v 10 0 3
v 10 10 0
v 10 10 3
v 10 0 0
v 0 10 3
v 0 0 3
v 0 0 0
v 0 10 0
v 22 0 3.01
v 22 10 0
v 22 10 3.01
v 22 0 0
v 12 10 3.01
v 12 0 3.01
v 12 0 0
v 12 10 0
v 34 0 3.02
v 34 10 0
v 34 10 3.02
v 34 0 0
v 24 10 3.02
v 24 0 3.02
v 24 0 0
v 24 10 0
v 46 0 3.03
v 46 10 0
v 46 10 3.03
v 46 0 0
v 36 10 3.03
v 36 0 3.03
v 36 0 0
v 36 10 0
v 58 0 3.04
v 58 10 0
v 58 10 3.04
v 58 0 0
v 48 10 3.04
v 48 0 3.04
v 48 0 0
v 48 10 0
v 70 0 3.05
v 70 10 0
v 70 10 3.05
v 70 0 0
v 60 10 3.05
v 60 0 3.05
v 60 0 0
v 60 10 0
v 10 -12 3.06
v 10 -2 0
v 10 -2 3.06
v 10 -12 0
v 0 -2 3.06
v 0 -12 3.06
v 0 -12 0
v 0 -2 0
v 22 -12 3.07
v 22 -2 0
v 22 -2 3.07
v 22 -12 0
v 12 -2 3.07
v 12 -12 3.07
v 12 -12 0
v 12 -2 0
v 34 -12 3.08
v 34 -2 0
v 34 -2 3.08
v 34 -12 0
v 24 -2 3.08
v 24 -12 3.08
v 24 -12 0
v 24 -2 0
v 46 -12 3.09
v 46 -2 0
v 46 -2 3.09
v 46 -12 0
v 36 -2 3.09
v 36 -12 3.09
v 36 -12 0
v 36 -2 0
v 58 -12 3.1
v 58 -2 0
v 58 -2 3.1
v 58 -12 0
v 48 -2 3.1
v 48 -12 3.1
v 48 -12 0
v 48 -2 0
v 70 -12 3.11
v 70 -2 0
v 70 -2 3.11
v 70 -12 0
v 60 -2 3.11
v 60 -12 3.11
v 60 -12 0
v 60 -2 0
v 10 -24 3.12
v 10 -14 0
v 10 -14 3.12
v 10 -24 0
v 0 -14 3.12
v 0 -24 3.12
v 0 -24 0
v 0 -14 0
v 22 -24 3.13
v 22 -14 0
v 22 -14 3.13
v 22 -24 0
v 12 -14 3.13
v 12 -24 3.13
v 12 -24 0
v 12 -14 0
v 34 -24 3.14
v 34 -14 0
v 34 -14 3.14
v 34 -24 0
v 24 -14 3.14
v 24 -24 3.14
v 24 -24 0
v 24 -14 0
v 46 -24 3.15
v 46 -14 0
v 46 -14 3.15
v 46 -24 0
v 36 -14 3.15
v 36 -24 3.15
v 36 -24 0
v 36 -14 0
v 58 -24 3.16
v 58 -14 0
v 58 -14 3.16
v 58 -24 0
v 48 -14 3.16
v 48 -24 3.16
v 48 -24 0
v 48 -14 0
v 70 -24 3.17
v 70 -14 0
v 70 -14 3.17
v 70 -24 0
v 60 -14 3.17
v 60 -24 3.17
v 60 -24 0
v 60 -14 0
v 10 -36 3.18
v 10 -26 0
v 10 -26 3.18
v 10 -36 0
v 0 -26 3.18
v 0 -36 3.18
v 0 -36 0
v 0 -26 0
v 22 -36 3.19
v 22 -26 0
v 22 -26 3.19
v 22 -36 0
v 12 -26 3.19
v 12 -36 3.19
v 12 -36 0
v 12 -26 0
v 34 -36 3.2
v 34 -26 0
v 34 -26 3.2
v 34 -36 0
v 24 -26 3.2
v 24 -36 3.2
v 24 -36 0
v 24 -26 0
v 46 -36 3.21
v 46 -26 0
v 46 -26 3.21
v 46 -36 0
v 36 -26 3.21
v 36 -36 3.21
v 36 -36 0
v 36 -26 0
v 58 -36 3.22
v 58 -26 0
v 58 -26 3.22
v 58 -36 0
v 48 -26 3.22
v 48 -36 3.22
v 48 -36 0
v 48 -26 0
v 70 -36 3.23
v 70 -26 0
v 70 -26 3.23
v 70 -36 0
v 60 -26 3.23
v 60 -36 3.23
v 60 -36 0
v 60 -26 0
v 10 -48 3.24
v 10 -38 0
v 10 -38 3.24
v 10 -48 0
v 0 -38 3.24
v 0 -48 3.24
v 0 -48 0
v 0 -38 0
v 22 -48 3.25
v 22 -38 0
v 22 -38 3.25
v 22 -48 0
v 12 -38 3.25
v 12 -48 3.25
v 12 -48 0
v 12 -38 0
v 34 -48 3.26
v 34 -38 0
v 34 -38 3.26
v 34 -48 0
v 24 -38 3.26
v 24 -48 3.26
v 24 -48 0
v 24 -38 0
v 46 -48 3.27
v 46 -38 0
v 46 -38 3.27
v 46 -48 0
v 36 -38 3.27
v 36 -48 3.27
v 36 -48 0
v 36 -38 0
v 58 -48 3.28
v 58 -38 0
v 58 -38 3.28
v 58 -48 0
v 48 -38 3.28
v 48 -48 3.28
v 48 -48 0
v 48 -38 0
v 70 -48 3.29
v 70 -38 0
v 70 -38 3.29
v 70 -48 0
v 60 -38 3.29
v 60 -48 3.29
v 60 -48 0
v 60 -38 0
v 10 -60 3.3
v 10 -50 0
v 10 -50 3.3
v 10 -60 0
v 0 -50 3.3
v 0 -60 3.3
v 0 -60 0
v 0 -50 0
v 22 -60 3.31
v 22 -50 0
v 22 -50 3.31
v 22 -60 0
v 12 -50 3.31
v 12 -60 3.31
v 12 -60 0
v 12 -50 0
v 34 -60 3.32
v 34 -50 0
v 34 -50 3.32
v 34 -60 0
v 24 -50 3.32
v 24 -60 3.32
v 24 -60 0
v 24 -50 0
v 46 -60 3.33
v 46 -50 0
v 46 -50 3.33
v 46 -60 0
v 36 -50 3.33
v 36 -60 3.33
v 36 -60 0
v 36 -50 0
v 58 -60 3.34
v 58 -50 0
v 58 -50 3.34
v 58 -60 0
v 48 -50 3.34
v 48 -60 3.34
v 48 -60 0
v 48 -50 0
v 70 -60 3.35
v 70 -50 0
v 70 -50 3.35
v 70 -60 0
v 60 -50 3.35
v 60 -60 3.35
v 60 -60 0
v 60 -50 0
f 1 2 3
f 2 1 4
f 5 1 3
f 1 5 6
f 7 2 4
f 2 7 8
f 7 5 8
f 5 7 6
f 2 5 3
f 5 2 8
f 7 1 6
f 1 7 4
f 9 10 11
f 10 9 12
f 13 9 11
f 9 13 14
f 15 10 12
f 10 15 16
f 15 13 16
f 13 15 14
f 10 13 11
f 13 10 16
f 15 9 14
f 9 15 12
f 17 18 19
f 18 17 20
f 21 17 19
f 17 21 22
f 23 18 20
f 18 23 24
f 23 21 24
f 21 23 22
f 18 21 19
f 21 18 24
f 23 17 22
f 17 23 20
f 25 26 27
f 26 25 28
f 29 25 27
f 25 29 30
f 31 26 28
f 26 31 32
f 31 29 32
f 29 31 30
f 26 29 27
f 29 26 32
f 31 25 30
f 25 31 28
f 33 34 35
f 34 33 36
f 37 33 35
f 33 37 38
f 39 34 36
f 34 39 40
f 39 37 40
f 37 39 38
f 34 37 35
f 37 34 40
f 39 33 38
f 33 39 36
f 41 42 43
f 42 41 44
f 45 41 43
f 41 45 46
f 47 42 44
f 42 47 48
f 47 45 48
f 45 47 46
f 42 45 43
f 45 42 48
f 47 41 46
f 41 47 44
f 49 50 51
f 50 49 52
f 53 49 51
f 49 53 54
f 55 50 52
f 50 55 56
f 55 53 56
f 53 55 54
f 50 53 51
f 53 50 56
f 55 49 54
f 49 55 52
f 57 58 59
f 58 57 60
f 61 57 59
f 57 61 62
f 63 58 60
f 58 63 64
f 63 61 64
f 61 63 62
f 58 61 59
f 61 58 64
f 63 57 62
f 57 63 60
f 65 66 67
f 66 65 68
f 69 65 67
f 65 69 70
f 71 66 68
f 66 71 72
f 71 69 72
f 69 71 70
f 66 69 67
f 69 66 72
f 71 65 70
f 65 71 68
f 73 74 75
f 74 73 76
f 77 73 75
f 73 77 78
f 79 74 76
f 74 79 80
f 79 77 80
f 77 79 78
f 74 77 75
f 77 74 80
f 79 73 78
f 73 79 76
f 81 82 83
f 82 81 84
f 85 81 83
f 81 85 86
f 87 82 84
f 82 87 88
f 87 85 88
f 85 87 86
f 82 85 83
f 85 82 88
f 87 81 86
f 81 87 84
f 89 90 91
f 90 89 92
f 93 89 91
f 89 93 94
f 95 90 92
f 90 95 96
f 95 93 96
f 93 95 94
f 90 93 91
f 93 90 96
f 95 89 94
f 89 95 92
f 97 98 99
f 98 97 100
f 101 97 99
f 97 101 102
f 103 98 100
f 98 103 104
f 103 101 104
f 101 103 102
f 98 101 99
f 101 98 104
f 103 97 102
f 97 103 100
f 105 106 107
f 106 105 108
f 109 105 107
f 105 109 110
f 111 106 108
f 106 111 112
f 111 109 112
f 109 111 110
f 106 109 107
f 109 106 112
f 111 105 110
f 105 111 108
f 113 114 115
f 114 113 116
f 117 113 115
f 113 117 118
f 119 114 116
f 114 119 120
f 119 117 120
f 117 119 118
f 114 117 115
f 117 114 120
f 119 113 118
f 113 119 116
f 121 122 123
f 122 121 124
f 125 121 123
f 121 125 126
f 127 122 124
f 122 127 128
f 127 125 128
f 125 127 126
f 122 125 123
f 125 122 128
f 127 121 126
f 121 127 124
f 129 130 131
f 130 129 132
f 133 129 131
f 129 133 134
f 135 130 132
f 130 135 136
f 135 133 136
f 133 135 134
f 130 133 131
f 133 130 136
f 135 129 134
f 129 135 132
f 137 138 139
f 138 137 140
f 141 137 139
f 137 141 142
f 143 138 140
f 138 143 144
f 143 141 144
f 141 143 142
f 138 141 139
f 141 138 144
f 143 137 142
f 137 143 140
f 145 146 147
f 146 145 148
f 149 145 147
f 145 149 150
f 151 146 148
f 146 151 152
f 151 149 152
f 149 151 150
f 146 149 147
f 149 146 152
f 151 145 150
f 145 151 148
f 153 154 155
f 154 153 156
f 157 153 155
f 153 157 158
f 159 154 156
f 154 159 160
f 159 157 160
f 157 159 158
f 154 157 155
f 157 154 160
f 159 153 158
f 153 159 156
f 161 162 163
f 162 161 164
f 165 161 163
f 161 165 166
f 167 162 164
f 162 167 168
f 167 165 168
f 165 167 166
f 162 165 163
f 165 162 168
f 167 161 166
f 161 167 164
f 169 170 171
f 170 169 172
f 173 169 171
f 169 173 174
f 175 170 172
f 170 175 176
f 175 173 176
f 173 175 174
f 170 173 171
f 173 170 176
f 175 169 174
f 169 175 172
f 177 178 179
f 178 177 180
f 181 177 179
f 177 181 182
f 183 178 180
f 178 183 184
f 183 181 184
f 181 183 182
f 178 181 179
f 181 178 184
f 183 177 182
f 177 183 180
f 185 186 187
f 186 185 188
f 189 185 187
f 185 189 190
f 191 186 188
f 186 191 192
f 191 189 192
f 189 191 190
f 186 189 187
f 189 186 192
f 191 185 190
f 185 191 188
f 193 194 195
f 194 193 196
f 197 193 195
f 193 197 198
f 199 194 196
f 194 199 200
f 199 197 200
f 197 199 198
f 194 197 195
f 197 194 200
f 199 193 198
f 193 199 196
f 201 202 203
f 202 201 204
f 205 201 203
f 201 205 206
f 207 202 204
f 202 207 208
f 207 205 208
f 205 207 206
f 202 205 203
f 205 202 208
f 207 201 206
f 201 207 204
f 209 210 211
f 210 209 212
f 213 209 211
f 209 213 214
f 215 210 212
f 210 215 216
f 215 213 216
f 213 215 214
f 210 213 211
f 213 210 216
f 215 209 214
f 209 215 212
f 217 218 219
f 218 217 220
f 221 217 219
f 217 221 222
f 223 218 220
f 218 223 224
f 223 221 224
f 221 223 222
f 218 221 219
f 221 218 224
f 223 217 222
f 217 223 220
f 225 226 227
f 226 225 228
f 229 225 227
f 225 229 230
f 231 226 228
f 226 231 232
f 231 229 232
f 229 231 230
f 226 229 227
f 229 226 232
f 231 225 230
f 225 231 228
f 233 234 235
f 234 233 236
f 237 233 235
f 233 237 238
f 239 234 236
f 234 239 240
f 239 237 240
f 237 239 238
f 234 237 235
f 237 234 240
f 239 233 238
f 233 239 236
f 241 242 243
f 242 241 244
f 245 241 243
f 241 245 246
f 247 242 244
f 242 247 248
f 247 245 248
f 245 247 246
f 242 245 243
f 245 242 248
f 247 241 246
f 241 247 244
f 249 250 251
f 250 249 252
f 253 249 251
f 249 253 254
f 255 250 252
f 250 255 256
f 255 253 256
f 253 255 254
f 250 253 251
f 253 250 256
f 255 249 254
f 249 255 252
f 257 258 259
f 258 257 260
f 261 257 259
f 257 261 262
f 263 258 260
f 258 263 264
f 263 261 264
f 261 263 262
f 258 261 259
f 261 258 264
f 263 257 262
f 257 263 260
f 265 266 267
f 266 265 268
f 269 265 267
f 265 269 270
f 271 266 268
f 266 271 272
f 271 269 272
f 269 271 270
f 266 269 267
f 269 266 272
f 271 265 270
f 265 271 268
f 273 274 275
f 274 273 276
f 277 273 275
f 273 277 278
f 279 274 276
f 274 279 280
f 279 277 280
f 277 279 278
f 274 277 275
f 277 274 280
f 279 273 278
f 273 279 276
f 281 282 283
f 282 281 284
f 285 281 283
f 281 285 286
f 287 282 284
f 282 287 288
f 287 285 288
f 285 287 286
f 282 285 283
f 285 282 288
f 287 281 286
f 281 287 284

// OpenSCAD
translate([0,0,0]) color("rot") cube([10,10,3+0*0.01]);
translate([12,0,0]) color("grün") cube([10,10,3+1*0.01]);
translate([24,0,0]) color("blau") cube([10,10,3+2*0.01]);
translate([36,0,0]) color("gelb") cube([10,10,3+3*0.01]);
translate([48,0,0]) color("lightblue") cube([10,10,3+4*0.01]);
translate([60,0,0]) color("darkred") cube([10,10,3+5*0.01]);
translate([0,-12,0]) color("navy") cube([10,10,3+6*0.01]);
translate([12,-12,0]) color("olive") cube([10,10,3+7*0.01]);
translate([24,-12,0]) color("maroon") cube([10,10,3+8*0.01]);
translate([36,-12,0]) color("coral") cube([10,10,3+9*0.01]);
translate([48,-12,0]) color("salmon") cube([10,10,3+10*0.01]);
translate([60,-12,0]) color("gold") cube([10,10,3+11*0.01]);
translate([0,-24,0]) color("violet") cube([10,10,3+12*0.01]);
translate([12,-24,0]) color("indigo") cube([10,10,3+13*0.01]);
translate([24,-24,0]) color("beige") cube([10,10,3+14*0.01]);
translate([36,-24,0]) color("tan") cube([10,10,3+15*0.01]);
translate([48,-24,0]) color("khaki") cube([10,10,3+16*0.01]);
translate([60,-24,0]) color("crimson") cube([10,10,3+17*0.01]);
translate([0,-36,0]) color("turquoise") cube([10,10,3+18*0.01]);
translate([12,-36,0]) color("lavender") cube([10,10,3+19*0.01]);
translate([24,-36,0]) color("mint") cube([10,10,3+20*0.01]);
translate([36,-36,0]) color("rose") cube([10,10,3+21*0.01]);
translate([48,-36,0]) color("Rot") cube([10,10,3+22*0.01]);
translate([60,-36,0]) color("ROT") cube([10,10,3+23*0.01]);
translate([0,-48,0]) color("foo") cube([10,10,3+24*0.01]);
translate([12,-48,0]) color("bar") cube([10,10,3+25*0.01]);
translate([24,-48,0]) color("baz") cube([10,10,3+26*0.01]);
translate([36,-48,0]) color("x") cube([10,10,3+27*0.01]);
translate([48,-48,0]) color("y") cube([10,10,3+28*0.01]);
translate([60,-48,0]) color("z") cube([10,10,3+29*0.01]);
translate([0,-60,0]) color("petrol") cube([10,10,3+30*0.01]);
translate([12,-60,0]) color("schwarz") cube([10,10,3+31*0.01]);
translate([24,-60,0]) color("weiss") cube([10,10,3+32*0.01]);
translate([36,-60,0]) color("orange2") cube([10,10,3+33*0.01]);
translate([48,-60,0]) color("red2") cube([10,10,3+34*0.01]);
translate([60,-60,0]) color("blue1") cube([10,10,3+35*0.01]);
